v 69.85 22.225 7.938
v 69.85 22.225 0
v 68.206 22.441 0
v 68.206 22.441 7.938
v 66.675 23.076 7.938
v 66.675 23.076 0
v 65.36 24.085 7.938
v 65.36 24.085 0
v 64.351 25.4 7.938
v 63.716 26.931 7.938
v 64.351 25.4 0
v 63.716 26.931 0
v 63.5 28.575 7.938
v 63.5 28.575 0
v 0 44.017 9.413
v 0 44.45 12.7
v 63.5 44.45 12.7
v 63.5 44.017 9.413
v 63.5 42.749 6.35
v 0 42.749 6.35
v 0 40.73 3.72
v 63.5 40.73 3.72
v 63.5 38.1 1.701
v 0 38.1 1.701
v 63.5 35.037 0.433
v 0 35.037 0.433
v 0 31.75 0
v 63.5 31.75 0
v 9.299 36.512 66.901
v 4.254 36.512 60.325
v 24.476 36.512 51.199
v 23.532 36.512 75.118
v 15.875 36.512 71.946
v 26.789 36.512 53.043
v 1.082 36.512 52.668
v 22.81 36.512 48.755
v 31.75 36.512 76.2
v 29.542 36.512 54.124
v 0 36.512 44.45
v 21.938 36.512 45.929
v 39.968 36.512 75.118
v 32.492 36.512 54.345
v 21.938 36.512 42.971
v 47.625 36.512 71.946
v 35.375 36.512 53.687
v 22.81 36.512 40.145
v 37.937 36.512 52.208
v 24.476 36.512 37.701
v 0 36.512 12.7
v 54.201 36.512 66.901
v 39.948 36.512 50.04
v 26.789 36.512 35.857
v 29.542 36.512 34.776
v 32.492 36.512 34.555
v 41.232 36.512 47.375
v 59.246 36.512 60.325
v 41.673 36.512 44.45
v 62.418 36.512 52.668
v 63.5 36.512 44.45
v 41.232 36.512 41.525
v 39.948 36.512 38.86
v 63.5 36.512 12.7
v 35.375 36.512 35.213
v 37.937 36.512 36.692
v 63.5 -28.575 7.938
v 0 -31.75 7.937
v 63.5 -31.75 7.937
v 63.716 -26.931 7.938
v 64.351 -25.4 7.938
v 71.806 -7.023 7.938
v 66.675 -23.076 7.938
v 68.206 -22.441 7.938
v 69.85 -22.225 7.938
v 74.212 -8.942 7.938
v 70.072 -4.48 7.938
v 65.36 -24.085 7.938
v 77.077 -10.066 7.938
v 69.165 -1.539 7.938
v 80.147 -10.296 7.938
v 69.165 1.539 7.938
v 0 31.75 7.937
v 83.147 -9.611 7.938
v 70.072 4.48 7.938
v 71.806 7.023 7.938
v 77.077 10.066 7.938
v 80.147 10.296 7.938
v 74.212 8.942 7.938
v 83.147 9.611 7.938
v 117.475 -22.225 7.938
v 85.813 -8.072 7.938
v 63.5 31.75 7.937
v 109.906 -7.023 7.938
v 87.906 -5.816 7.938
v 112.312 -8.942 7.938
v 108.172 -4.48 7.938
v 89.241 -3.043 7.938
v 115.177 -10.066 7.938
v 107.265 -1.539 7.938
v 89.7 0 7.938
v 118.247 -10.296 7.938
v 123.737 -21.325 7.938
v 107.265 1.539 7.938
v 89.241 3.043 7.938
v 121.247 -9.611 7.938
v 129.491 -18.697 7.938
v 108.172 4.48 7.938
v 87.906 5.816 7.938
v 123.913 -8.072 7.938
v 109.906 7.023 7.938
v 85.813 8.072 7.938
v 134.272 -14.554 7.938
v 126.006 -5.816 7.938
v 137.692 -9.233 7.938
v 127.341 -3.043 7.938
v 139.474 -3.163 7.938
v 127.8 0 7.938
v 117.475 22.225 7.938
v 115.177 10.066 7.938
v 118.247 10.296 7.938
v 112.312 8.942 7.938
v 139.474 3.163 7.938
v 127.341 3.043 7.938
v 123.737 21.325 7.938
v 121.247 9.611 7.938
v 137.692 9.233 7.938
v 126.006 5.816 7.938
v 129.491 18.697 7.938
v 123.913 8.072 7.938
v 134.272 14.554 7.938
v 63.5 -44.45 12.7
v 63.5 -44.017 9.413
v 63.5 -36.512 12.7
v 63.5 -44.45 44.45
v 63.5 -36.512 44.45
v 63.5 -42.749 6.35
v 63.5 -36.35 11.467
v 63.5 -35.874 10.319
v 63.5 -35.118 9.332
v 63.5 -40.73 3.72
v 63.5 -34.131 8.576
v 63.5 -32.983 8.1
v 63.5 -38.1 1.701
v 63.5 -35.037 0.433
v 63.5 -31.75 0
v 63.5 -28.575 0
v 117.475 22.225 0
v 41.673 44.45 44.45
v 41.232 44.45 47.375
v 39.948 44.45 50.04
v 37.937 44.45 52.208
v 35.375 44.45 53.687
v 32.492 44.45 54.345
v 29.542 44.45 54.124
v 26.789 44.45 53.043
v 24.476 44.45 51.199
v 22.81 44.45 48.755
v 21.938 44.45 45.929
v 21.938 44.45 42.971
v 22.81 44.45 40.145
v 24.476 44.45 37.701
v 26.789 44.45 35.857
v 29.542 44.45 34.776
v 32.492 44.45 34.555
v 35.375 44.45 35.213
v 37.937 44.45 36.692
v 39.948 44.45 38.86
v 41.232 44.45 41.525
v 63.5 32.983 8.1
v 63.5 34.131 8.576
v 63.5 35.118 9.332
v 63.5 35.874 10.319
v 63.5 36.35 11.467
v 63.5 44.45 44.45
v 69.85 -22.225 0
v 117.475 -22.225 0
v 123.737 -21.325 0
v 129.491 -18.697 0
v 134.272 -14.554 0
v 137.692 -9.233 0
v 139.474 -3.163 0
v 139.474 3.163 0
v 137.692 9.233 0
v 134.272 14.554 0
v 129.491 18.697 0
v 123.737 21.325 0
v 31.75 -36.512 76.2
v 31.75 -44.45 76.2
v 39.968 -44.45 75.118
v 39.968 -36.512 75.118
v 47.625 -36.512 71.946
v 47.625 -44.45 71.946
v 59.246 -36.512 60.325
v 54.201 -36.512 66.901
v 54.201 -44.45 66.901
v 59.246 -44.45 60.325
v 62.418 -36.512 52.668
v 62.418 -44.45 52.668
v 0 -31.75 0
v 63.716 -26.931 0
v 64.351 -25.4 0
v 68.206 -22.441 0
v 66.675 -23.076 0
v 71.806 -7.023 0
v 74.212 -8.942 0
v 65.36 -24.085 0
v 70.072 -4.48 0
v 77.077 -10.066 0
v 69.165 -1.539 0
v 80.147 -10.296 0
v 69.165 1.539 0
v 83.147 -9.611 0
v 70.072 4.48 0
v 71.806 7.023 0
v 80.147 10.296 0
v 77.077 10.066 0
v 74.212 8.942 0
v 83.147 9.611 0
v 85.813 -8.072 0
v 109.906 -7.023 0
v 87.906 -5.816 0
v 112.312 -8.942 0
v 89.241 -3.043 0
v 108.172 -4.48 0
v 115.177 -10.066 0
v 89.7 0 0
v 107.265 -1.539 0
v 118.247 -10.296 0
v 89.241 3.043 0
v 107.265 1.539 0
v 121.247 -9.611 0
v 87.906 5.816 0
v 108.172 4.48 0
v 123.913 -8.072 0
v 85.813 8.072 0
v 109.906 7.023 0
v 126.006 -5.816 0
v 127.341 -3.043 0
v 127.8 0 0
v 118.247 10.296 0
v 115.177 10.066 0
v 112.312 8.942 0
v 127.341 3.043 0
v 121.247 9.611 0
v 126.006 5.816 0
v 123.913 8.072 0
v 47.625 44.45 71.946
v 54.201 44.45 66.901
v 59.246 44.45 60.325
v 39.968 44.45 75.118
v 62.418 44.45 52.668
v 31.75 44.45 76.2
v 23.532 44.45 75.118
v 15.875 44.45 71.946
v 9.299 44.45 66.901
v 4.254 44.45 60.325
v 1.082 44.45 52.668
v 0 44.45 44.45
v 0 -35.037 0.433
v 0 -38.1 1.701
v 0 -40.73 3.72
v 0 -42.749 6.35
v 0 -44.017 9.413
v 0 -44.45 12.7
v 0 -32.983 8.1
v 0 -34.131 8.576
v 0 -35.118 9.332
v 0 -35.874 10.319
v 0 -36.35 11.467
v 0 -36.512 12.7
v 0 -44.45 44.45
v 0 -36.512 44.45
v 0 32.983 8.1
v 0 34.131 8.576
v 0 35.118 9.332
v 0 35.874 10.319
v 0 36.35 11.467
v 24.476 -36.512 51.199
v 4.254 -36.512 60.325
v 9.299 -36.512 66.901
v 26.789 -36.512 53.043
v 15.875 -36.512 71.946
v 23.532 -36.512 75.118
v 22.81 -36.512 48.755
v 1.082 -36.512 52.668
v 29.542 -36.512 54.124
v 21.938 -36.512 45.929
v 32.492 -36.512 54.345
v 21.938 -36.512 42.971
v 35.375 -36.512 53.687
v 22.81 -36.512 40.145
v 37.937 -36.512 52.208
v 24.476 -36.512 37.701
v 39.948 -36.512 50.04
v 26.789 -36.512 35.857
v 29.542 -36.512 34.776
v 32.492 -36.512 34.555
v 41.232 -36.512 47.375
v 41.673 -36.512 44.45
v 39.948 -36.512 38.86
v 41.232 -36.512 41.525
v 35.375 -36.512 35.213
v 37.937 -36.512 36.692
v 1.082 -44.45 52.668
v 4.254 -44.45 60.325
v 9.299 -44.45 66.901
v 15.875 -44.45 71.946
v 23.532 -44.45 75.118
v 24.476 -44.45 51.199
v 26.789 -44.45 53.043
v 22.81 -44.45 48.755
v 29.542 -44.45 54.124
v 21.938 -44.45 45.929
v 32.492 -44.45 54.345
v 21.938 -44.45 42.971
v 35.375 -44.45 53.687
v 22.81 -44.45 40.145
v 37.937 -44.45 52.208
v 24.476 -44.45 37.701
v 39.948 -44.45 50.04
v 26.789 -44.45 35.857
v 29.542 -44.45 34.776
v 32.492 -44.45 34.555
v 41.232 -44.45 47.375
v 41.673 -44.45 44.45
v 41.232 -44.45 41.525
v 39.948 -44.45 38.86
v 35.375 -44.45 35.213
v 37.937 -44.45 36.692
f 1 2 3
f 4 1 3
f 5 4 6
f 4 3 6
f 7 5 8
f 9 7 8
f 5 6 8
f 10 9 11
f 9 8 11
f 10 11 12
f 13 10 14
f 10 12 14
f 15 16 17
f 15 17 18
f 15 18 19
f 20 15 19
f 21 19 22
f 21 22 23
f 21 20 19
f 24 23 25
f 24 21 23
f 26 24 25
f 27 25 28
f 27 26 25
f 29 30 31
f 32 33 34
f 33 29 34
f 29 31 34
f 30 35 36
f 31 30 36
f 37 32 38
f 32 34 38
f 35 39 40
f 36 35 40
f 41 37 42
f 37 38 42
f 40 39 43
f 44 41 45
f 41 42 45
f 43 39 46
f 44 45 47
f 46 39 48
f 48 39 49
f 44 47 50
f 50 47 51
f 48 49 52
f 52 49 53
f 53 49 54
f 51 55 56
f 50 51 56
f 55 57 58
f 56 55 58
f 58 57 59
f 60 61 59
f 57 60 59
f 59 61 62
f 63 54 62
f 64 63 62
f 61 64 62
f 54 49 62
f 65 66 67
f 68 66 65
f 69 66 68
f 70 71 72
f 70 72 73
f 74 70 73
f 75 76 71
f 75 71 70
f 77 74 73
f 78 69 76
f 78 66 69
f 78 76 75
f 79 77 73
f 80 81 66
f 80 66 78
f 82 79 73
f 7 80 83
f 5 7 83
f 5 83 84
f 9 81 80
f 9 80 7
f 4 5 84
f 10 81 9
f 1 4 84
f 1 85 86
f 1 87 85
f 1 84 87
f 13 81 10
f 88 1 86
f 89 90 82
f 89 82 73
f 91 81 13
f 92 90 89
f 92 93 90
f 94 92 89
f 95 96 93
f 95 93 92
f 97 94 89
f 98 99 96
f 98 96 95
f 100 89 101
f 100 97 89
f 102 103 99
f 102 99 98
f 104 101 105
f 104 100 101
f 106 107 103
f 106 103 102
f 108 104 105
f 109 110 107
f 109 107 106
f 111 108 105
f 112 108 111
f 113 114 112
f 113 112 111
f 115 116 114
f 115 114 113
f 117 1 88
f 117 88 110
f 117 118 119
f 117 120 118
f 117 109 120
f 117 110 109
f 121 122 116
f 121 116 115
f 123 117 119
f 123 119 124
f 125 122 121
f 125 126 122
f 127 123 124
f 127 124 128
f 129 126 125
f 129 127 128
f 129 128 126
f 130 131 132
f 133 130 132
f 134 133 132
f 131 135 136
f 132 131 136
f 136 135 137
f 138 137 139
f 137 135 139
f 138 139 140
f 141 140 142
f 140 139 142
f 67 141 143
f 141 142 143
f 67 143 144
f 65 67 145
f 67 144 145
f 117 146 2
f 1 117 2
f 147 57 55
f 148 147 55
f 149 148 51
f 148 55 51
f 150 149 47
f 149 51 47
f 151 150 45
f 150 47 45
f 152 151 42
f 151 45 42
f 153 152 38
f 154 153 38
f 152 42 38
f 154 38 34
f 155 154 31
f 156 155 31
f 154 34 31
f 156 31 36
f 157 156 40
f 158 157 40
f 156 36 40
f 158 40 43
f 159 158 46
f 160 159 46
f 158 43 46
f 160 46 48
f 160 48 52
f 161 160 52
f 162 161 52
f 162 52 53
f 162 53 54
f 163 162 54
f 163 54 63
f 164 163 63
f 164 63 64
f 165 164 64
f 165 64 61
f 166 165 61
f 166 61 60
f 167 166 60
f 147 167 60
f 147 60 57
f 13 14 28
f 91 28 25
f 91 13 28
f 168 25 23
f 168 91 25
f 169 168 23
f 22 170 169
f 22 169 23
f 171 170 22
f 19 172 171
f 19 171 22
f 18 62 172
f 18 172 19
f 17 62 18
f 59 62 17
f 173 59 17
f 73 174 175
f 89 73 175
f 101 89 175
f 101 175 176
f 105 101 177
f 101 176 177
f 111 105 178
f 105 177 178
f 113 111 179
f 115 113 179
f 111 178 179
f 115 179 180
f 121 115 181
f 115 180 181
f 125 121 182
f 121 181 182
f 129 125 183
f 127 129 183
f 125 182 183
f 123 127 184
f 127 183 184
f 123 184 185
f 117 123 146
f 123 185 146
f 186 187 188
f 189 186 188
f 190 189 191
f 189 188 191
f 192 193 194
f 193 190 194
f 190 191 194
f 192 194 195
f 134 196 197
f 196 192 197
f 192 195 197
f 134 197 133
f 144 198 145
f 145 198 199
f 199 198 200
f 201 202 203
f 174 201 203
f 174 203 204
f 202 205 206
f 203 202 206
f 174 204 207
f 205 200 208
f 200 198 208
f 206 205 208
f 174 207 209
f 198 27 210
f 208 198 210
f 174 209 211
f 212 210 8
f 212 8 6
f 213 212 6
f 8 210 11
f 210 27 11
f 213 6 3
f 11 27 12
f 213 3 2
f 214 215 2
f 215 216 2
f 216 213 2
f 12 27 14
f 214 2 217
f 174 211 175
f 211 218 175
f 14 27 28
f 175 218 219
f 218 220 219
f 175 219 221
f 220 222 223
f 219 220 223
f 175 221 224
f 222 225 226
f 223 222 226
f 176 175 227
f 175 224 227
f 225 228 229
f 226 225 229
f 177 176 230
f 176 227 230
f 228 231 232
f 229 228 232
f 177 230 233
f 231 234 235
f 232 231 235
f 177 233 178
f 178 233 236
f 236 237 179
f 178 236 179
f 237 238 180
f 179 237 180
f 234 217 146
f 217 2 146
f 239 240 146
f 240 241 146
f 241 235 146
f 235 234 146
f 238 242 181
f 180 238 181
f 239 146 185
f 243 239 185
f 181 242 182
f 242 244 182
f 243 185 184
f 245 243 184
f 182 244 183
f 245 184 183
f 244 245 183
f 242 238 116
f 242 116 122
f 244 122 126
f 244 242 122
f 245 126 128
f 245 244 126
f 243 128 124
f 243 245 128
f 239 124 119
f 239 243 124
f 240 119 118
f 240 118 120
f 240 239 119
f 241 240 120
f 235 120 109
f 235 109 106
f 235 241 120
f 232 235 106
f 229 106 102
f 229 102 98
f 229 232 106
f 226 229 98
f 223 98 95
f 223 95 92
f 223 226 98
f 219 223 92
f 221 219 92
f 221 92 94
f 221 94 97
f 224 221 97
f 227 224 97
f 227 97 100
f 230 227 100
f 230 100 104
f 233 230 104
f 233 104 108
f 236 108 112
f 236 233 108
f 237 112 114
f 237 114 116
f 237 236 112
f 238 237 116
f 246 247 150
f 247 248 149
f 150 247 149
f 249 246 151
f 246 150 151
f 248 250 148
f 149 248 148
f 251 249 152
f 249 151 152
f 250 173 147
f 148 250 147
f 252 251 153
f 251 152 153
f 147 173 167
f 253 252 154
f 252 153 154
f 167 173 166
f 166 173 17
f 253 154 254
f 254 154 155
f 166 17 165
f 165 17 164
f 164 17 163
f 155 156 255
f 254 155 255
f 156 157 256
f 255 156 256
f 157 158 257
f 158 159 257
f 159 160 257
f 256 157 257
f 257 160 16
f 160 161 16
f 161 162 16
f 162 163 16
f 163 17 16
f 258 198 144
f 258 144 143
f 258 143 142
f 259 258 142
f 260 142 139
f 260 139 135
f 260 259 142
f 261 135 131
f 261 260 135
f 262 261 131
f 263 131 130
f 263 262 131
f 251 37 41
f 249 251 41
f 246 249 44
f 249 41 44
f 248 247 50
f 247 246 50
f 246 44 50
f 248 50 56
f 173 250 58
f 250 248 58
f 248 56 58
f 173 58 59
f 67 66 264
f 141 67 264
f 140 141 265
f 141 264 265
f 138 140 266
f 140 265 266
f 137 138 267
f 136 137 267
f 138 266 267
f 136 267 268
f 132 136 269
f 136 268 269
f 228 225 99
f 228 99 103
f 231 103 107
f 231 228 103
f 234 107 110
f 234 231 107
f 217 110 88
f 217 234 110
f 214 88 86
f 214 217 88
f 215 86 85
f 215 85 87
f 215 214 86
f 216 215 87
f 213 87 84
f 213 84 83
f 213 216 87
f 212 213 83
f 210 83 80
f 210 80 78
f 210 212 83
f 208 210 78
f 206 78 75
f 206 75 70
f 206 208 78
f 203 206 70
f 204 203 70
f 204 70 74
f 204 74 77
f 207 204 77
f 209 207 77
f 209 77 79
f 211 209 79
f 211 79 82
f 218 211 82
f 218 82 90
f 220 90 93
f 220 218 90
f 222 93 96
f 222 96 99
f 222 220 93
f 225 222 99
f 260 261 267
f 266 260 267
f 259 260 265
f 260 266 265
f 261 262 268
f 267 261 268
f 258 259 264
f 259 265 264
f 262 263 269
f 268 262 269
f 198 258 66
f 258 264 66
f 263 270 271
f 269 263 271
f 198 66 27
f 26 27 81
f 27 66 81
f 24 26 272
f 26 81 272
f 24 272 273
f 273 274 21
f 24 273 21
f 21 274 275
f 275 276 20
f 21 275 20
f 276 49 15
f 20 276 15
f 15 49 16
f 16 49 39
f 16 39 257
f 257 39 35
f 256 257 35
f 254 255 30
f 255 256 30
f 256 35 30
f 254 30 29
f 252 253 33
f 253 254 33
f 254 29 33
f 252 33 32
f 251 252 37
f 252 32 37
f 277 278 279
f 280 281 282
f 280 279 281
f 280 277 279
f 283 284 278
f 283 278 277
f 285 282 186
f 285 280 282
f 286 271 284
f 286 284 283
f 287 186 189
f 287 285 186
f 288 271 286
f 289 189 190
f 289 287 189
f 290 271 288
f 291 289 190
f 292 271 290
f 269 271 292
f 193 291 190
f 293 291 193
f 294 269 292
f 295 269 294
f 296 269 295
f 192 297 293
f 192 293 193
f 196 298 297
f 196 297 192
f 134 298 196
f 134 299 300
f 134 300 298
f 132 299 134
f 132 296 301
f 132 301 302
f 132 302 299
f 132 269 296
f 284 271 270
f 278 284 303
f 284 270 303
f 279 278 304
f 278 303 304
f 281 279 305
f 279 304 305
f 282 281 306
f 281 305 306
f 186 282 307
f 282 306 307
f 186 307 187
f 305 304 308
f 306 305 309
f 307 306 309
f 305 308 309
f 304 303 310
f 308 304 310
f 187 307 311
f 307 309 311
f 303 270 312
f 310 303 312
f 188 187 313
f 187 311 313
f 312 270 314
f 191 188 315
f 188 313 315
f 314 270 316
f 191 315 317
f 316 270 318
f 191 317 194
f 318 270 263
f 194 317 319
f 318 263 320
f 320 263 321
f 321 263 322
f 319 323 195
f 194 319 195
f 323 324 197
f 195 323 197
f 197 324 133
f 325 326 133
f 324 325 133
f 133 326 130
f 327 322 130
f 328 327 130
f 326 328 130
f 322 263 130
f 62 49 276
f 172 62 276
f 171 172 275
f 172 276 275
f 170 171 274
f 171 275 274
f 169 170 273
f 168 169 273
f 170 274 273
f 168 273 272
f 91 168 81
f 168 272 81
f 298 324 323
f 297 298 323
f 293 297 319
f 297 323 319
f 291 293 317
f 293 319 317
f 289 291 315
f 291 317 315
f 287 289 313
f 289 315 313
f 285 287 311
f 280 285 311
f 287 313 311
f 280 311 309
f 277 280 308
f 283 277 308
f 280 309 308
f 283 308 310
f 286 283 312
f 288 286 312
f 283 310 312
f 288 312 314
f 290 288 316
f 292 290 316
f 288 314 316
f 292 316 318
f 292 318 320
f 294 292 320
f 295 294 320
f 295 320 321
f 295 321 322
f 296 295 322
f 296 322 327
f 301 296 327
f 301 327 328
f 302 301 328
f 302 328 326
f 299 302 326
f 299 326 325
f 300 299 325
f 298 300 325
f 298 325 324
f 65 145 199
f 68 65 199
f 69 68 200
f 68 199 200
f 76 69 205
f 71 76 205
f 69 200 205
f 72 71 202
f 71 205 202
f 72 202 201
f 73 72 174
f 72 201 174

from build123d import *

# Parameters (mm, degrees)
F0_R     = 10.3251
F1_DEPTH = 7.9375
F2_W     = 63.5
F2_H     = 7.9375
F3_DEPTH = 68.2625
F4_R     = 9.92251
F5_DEPTH = 88.901
F7_DEPTH = 139.701
F8_DEPTH = 63.5


with BuildPart() as f1:
    # F0 (on Top) → F1 (new body)
    with BuildSketch(Plane.XY):
        with BuildLine():
            Line((63.5, 44.45), (0, 44.45))
            Line((0, 44.45), (0, -44.45))
            Line((0, -44.45), (63.5, -44.45))
            Line((63.5, -44.45), (63.5, -28.575))
            ThreePointArc((63.5, -28.575), (65.359872, -24.084872), (69.85, -22.225))
            Line((69.85, -22.225), (117.475, -22.225))
            ThreePointArc((117.475, -22.225), (139.7, 0), (117.475, 22.225))
            Line((117.475, 22.225), (69.85, 22.225))
            ThreePointArc((69.85, 22.225), (65.359872, 24.084872), (63.5, 28.575))
            Line((63.5, 28.575), (63.5, 44.45))
        make_face()
        with Locations((79.375, 0)):
            Circle(F0_R, mode=Mode.SUBTRACT)
        with Locations((117.475, 0)):
            Circle(F0_R, mode=Mode.SUBTRACT)
    extrude(amount=F1_DEPTH)

    # F2 (on face) → F3 (join)
    with BuildSketch(Plane.XY.offset(7.9375)):
        with Locations((31.75, -40.48125)):
            Rectangle(F2_W, F2_H)
        with Locations((31.75, 40.48125)):
            Rectangle(F2_W, F2_H)
    extrude(amount=F3_DEPTH)

    # F4 (on face) → F5 (cut, through all)
    with BuildSketch(Plane.XZ.offset(44.45)):
        with BuildLine():
            ThreePointArc((0, 44.45), (9.29936, 66.90064), (31.75, 76.2))
            Line((31.75, 76.2), (0, 76.2))
            Line((0, 76.2), (0, 44.45))
        make_face()
        with BuildLine():
            ThreePointArc((31.75, 76.2), (54.20064, 66.90064), (63.5, 44.45))
            Line((63.5, 44.45), (63.5, 76.2))
            Line((63.5, 76.2), (31.75, 76.2))
        make_face()
        with Locations((31.75, 44.45)):
            Circle(F4_R)
    extrude(amount=-F5_DEPTH, mode=Mode.SUBTRACT)

    # F6 (on Right) → F7 (cut, through all)
    with BuildSketch(Plane.YZ):
        with BuildLine():
            ThreePointArc((-31.75, 0), (-40.730256, 3.719744), (-44.45, 12.7))
            Line((-44.45, 12.7), (-44.45, 0))
            Line((-44.45, 0), (-31.75, 0))
        make_face()
        with BuildLine():
            ThreePointArc((44.45, 12.7), (40.730256, 3.719744), (31.75, 0))
            Line((31.75, 0), (44.45, 0))
            Line((44.45, 0), (44.45, 12.7))
        make_face()
    extrude(amount=F7_DEPTH, mode=Mode.SUBTRACT)

    # F6 (on Right) → F8 (join)
    with BuildSketch(Plane.YZ):
        with BuildLine():
            ThreePointArc((36.5125, 12.7), (35.117596, 9.332404), (31.75, 7.9375))
            Line((31.75, 7.9375), (36.5125, 7.9375))
            Line((36.5125, 7.9375), (36.5125, 12.7))
        make_face()
        with BuildLine():
            ThreePointArc((-31.75, 7.9375), (-35.117596, 9.332404), (-36.5125, 12.7))
            Line((-36.5125, 12.7), (-36.5125, 7.9375))
            Line((-36.5125, 7.9375), (-31.75, 7.9375))
        make_face()
    extrude(amount=F8_DEPTH)


solid = f1.part
